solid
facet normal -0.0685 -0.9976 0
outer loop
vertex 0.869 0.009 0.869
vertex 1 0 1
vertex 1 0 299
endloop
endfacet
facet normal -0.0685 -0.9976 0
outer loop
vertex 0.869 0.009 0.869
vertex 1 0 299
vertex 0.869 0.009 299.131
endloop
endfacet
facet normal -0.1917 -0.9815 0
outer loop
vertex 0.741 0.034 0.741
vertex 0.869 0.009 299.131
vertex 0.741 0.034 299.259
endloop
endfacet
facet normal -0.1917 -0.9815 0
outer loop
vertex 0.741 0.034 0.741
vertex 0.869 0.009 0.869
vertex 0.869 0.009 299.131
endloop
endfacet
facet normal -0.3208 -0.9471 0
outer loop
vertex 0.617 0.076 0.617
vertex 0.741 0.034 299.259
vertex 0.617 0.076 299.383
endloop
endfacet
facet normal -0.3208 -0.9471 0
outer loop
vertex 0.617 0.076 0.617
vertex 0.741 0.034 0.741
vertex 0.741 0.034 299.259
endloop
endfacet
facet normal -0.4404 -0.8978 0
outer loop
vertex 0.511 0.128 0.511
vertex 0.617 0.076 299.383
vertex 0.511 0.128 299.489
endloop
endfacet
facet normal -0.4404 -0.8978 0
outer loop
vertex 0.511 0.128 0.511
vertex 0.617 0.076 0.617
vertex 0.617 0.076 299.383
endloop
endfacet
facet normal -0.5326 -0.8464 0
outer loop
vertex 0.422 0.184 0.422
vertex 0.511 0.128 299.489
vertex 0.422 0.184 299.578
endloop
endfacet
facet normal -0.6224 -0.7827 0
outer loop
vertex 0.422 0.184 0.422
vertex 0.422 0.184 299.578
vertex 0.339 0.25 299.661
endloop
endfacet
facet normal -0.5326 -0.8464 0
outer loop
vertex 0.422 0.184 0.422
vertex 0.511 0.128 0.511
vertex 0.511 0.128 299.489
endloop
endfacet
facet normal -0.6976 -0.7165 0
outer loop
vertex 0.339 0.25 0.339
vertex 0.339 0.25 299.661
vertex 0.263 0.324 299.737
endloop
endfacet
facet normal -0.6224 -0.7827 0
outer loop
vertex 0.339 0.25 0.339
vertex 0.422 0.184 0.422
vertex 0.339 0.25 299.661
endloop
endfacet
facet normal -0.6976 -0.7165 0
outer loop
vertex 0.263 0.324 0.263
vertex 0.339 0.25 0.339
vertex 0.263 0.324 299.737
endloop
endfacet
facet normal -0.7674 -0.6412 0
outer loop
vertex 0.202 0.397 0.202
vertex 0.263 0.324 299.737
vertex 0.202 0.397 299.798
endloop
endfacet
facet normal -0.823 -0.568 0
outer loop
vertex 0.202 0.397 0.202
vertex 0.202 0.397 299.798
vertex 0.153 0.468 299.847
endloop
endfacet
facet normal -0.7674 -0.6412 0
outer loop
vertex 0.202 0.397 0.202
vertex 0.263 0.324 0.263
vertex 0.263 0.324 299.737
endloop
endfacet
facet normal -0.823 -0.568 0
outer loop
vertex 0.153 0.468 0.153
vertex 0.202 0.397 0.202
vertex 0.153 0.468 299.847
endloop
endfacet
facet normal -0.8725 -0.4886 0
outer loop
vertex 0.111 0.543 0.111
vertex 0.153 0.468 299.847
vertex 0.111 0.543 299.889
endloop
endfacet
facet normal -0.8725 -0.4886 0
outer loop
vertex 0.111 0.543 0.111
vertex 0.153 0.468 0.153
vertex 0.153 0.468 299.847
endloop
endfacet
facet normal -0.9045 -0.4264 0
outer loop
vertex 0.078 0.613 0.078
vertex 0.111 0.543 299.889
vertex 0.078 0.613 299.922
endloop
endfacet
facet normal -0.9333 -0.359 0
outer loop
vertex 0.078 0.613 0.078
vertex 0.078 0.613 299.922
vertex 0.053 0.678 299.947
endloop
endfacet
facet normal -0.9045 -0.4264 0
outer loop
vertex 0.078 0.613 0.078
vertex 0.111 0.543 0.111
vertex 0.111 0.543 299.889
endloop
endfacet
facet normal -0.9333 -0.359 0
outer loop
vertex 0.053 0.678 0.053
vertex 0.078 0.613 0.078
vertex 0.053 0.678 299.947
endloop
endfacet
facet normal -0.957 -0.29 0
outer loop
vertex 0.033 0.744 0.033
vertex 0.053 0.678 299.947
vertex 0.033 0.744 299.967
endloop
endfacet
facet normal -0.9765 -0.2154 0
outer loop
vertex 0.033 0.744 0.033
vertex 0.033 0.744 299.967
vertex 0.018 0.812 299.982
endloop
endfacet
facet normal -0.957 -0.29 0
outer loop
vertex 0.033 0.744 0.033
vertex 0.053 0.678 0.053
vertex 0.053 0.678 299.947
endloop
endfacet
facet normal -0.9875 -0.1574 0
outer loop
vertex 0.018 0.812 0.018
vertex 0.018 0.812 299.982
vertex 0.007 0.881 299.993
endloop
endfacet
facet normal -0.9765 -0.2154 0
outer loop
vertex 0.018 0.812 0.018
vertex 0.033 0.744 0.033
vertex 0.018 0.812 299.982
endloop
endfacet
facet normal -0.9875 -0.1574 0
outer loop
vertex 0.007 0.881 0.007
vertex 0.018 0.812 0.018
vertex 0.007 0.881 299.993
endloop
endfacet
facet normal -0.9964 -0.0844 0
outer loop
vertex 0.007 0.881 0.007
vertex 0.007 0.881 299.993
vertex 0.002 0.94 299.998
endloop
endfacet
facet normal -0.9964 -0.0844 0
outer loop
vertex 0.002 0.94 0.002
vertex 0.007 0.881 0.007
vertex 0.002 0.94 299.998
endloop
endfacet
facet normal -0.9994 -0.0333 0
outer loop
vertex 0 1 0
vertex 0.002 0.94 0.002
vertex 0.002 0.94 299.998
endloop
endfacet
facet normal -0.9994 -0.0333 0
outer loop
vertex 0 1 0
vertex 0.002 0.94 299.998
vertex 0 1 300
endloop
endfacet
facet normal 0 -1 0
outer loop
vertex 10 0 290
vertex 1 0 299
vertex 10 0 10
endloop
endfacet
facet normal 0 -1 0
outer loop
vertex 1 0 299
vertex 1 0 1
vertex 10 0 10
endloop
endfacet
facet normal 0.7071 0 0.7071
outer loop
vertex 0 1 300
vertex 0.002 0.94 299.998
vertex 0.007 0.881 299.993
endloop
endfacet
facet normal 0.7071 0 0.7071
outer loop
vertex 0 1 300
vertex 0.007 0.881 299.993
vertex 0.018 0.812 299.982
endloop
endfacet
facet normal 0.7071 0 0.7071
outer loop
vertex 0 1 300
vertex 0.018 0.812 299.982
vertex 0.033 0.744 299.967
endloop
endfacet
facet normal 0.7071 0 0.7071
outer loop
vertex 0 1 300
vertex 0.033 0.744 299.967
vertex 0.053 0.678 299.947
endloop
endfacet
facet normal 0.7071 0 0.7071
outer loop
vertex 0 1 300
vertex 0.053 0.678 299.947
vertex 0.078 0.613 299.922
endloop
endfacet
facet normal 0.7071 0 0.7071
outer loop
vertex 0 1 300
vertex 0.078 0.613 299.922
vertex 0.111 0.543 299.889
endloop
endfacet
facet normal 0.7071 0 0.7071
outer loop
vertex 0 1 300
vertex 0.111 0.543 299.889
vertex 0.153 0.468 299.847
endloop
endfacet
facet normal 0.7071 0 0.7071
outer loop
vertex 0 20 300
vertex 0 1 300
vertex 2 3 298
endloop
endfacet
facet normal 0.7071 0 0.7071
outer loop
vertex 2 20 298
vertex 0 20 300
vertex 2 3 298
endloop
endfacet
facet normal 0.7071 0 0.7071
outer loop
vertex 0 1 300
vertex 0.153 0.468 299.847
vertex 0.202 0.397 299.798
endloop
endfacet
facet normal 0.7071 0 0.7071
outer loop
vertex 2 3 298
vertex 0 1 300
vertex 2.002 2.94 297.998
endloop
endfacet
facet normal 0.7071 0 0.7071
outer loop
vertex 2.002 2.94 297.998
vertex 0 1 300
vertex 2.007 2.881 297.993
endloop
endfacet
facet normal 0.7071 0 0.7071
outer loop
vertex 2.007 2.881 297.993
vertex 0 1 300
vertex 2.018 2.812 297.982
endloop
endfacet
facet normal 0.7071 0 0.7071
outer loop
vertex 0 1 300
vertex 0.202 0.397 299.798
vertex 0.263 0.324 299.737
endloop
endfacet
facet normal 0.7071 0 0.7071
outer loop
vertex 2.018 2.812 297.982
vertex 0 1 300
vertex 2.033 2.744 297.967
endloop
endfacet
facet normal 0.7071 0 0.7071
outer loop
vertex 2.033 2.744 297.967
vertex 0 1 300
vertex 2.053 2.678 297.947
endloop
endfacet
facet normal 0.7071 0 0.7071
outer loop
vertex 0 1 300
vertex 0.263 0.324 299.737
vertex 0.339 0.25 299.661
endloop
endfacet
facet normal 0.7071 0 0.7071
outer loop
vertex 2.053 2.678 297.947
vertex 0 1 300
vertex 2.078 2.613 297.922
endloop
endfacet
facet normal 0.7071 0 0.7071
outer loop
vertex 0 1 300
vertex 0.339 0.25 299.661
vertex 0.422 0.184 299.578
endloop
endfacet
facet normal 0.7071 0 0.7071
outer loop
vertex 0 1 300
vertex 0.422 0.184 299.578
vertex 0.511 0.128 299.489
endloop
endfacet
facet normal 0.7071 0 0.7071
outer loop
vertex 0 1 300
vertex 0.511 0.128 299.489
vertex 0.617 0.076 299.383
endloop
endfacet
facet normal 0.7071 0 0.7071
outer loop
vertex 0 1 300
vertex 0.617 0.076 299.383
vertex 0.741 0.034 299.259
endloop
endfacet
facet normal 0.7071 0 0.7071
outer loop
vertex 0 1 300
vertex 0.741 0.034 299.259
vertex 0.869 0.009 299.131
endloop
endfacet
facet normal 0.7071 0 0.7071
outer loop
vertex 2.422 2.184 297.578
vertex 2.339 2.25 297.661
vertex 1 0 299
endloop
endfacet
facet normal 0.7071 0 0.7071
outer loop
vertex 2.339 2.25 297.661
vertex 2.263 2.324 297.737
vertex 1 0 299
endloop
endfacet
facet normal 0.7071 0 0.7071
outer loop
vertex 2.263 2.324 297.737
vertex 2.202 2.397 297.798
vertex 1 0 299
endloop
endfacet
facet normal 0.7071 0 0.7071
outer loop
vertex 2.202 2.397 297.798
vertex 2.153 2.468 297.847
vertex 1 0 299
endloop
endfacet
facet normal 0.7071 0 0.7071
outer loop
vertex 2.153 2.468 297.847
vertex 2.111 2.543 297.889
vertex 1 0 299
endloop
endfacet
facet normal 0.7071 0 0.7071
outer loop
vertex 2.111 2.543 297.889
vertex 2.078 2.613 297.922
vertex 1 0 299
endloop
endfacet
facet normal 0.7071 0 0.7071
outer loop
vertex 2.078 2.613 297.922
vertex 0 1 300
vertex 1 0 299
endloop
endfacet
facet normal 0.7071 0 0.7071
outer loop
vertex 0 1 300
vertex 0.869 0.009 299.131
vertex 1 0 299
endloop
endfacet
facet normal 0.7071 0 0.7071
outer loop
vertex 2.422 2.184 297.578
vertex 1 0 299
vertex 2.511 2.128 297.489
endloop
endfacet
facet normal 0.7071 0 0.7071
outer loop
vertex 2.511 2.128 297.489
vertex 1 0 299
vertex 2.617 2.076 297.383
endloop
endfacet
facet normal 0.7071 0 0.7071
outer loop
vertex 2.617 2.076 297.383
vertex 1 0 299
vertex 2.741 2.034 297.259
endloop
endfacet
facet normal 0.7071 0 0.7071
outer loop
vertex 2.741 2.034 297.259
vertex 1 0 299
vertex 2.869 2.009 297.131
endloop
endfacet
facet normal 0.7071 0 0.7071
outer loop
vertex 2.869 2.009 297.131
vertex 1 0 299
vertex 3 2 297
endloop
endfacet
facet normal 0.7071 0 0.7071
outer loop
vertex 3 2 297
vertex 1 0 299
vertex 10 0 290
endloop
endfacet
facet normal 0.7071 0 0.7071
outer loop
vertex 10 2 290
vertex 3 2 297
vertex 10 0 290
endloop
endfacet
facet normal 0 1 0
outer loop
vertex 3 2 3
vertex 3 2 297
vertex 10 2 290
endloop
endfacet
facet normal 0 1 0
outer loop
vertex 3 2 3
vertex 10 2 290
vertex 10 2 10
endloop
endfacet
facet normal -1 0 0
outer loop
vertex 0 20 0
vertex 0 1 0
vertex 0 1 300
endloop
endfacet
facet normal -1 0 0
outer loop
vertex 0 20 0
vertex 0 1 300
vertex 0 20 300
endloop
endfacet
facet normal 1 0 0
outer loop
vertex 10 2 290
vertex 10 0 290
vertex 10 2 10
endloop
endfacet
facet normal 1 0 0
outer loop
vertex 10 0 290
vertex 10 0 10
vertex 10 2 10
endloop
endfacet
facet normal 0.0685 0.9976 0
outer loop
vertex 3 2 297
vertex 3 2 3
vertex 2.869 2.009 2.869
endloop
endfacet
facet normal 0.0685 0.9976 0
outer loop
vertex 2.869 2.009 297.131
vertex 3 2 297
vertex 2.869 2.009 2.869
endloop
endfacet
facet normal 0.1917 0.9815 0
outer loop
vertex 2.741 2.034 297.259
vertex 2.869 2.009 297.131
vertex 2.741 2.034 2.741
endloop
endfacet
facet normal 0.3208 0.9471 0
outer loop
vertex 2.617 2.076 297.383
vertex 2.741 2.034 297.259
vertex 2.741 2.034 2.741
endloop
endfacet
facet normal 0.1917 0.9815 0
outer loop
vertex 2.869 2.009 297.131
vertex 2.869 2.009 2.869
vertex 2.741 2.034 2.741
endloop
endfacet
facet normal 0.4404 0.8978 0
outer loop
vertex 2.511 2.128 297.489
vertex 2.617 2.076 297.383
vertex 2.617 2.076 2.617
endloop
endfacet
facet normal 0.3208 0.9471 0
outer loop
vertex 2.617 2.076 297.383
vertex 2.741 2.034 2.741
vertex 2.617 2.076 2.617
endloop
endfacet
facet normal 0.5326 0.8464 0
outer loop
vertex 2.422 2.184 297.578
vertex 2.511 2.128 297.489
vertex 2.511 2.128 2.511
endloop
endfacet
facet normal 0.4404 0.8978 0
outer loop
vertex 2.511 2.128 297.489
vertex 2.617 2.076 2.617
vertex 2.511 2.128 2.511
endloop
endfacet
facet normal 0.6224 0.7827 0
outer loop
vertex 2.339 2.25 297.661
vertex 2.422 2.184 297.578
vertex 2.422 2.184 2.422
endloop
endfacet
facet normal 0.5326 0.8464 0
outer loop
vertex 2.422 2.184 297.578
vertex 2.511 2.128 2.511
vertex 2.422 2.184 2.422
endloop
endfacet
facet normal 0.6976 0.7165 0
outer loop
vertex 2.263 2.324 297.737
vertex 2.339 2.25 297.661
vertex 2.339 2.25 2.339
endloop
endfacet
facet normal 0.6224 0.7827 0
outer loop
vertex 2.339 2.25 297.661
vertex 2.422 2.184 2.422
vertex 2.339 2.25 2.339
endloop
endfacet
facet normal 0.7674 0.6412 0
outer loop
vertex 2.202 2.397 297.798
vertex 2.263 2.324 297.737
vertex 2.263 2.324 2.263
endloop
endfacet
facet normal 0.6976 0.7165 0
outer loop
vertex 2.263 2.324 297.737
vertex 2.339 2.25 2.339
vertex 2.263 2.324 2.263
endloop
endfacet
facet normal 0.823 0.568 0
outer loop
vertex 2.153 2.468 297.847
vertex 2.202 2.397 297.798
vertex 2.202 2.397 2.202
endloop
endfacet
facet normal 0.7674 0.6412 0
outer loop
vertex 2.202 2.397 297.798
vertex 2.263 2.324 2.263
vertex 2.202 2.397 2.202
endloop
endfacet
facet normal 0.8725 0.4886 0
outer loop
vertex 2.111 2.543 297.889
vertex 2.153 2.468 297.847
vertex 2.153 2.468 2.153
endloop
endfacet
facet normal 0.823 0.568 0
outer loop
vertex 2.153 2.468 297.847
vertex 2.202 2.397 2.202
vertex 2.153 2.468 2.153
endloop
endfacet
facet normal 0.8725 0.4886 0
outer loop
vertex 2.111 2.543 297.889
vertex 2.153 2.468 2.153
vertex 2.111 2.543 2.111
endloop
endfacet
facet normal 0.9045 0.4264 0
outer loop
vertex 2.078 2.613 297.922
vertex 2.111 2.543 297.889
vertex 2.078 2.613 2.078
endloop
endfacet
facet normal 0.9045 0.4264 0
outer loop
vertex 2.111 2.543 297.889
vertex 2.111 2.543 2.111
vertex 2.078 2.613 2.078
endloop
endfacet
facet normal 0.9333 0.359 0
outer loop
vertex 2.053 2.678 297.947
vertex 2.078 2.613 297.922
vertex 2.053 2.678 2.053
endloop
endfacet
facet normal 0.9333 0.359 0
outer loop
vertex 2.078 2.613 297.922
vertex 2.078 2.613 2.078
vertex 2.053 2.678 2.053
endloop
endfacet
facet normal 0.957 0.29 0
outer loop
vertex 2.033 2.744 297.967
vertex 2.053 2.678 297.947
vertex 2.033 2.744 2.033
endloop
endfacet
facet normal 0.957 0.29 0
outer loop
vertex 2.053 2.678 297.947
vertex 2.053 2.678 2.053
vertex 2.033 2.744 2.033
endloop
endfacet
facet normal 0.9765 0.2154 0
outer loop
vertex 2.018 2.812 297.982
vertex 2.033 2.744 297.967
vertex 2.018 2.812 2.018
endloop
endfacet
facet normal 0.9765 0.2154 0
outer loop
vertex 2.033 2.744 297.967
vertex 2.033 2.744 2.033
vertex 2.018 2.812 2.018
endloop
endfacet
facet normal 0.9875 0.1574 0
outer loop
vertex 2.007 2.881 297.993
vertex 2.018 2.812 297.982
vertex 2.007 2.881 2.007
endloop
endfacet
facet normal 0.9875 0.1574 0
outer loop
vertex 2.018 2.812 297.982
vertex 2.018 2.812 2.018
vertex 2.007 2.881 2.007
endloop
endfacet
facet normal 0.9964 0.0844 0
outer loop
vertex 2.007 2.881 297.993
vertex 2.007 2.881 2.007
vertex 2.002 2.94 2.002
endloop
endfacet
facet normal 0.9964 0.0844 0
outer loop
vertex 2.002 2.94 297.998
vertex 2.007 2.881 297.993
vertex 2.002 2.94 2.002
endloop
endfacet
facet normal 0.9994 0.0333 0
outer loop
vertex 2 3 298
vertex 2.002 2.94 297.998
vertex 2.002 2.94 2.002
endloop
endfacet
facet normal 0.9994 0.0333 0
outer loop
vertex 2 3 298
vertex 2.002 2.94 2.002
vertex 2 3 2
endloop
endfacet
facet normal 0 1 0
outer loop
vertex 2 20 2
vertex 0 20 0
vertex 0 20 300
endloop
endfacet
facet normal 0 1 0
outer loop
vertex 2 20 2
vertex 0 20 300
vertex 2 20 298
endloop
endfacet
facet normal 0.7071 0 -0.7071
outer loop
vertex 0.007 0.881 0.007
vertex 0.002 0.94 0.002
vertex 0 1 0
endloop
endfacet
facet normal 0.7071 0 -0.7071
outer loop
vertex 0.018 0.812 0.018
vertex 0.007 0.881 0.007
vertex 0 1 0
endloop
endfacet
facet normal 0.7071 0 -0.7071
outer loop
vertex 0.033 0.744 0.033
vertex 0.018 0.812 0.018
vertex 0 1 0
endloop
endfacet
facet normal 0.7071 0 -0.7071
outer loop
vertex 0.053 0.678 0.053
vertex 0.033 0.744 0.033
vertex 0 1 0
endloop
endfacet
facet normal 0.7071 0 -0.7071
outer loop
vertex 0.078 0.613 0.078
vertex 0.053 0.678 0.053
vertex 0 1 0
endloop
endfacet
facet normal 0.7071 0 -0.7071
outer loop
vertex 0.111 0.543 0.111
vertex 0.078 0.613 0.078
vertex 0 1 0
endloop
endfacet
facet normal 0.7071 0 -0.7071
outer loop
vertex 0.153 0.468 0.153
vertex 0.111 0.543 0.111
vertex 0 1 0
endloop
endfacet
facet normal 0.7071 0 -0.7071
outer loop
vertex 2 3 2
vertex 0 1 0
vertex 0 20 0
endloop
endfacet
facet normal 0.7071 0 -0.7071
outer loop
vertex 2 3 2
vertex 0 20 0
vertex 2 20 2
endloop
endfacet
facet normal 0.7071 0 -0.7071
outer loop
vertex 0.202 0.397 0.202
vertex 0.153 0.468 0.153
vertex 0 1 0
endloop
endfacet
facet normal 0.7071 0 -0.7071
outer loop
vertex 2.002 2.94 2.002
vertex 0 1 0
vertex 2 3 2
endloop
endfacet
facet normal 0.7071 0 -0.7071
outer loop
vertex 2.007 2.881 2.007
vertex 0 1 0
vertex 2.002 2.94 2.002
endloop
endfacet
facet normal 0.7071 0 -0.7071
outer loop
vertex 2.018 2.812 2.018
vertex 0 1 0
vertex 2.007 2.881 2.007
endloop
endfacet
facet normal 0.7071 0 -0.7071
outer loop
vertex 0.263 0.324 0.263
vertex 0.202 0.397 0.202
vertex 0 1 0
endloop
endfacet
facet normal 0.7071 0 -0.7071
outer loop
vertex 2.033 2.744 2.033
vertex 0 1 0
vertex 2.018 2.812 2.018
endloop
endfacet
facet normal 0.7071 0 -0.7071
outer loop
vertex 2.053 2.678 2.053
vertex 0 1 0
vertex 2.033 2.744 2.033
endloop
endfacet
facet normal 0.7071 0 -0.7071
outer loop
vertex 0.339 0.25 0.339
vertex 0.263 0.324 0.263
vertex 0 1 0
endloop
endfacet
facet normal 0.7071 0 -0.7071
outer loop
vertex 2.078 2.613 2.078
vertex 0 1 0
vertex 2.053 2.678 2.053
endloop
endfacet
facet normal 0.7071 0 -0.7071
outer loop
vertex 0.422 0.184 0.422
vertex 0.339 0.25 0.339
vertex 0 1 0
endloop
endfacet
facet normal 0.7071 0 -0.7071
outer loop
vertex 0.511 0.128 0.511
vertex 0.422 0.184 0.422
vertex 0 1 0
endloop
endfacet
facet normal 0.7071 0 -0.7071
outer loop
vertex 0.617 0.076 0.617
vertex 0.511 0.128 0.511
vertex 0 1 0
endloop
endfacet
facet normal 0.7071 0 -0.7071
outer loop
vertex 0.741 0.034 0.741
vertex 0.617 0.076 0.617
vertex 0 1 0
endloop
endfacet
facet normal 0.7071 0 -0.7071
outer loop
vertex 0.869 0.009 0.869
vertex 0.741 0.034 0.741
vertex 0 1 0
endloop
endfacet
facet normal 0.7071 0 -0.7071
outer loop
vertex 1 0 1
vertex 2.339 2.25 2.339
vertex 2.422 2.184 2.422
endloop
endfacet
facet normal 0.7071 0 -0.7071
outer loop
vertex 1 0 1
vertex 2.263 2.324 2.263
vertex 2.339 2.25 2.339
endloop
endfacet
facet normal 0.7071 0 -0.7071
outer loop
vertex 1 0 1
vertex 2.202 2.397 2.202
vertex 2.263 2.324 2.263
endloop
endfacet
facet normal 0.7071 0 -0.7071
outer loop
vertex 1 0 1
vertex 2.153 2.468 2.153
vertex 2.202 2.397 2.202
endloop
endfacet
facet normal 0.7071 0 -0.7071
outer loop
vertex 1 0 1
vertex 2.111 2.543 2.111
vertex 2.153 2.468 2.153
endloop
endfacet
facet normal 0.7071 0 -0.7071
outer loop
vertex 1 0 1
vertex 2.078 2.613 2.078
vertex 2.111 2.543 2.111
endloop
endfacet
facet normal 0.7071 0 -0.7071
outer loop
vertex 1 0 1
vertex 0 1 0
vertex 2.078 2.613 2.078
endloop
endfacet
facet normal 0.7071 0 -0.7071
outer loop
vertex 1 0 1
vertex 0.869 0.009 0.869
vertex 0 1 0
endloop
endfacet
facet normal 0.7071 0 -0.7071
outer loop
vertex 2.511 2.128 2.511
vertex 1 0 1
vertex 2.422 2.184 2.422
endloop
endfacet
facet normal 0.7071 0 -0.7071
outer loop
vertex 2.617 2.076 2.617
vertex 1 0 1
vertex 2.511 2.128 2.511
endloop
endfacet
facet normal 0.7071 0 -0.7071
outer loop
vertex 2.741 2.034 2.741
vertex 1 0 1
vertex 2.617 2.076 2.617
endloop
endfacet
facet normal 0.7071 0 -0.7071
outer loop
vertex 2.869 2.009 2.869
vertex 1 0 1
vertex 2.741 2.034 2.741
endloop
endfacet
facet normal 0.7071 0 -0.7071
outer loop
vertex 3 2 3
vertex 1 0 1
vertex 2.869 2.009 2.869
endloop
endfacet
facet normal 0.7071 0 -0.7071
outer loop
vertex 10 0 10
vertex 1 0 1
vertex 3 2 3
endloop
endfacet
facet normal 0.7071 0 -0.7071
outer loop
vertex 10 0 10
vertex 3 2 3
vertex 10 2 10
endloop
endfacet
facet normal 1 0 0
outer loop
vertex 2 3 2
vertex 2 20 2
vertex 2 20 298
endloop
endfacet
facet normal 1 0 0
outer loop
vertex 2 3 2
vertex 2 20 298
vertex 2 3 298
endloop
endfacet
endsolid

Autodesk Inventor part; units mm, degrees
ref_plane "YZ Plane" through (0, 0, 0) normal (1, 0, 0) x (0, 1, 0)
ref_plane "XZ Plane" through (0, 0, 0) normal (0, 1, 0) x (-1, 0, 0)
ref_plane "XY Plane" through (0, 0, 0) normal (0, 0, 1) x (1, 0, 0)
sketch "Szkic1" plane through (0, 0, 0) normal (0, 0, 1) x (1, 0, 0)
  line L0 (-2.2485, 0) -> (12.0414, 0) projected
  line L1 (0, -4.2485) -> (0, 24.0414) projected
  line L2 (10, 0) -> (1, 0)
  line L3 (0, 1) -> (0, 20)
  line L4 (2, 20) -> (2, 3)
  line L5 (3, 2) -> (10, 2)
  line L6 (0, 20) -> (2, 20)
  line L7 (10, 0) -> (10, 2)
  arc A0 (2, 3) -> (3, 2) centre (3, 3) ccw
  arc A1 (0, 1) -> (1, 0) centre (1, 1) ccw
  point P0 (0, 0)
  dimension "d0" = 20
  dimension "d1" = 10
  dimension "d2" = 2
  dimension "d3" = 1
extrude "Wyciągnięcie proste1" add sketch "Szkic1" along normal blind 300 contours A1 L1 L6 L4 A0 L5 L7 L0
sketch "Szkic2" plane through (1, 0, 0) normal (0, -1, 0) x (1, 0, 0)
  line L0 (0, 0) -> (9, 0) projected
  line L1 (9, 0) -> (9, 300) projected
  line L2 (0, 300) -> (9, 300) projected
  line L3 (-1, 0) -> (-1, 300) projected
  line L4 (-1, 300) -> (9, 290)
  line L5 (9, 290) -> (9, 300)
  line L6 (9, 300) -> (-1, 300)
  line L7 (-1, 0) -> (9, 10)
  line L8 (9, 10) -> (9, 0)
  line L9 (9, 0) -> (-1, 0)
  dimension "d6" = 135
  dimension "d7" = 45
extrude "Wyciągnięcie proste2" cut sketch "Szkic2" against normal through all contours L9 L7 L1 L0 | L6 L2 L1 L4
properties part number "kątownik_mały1" material "Aluminium 6061"
